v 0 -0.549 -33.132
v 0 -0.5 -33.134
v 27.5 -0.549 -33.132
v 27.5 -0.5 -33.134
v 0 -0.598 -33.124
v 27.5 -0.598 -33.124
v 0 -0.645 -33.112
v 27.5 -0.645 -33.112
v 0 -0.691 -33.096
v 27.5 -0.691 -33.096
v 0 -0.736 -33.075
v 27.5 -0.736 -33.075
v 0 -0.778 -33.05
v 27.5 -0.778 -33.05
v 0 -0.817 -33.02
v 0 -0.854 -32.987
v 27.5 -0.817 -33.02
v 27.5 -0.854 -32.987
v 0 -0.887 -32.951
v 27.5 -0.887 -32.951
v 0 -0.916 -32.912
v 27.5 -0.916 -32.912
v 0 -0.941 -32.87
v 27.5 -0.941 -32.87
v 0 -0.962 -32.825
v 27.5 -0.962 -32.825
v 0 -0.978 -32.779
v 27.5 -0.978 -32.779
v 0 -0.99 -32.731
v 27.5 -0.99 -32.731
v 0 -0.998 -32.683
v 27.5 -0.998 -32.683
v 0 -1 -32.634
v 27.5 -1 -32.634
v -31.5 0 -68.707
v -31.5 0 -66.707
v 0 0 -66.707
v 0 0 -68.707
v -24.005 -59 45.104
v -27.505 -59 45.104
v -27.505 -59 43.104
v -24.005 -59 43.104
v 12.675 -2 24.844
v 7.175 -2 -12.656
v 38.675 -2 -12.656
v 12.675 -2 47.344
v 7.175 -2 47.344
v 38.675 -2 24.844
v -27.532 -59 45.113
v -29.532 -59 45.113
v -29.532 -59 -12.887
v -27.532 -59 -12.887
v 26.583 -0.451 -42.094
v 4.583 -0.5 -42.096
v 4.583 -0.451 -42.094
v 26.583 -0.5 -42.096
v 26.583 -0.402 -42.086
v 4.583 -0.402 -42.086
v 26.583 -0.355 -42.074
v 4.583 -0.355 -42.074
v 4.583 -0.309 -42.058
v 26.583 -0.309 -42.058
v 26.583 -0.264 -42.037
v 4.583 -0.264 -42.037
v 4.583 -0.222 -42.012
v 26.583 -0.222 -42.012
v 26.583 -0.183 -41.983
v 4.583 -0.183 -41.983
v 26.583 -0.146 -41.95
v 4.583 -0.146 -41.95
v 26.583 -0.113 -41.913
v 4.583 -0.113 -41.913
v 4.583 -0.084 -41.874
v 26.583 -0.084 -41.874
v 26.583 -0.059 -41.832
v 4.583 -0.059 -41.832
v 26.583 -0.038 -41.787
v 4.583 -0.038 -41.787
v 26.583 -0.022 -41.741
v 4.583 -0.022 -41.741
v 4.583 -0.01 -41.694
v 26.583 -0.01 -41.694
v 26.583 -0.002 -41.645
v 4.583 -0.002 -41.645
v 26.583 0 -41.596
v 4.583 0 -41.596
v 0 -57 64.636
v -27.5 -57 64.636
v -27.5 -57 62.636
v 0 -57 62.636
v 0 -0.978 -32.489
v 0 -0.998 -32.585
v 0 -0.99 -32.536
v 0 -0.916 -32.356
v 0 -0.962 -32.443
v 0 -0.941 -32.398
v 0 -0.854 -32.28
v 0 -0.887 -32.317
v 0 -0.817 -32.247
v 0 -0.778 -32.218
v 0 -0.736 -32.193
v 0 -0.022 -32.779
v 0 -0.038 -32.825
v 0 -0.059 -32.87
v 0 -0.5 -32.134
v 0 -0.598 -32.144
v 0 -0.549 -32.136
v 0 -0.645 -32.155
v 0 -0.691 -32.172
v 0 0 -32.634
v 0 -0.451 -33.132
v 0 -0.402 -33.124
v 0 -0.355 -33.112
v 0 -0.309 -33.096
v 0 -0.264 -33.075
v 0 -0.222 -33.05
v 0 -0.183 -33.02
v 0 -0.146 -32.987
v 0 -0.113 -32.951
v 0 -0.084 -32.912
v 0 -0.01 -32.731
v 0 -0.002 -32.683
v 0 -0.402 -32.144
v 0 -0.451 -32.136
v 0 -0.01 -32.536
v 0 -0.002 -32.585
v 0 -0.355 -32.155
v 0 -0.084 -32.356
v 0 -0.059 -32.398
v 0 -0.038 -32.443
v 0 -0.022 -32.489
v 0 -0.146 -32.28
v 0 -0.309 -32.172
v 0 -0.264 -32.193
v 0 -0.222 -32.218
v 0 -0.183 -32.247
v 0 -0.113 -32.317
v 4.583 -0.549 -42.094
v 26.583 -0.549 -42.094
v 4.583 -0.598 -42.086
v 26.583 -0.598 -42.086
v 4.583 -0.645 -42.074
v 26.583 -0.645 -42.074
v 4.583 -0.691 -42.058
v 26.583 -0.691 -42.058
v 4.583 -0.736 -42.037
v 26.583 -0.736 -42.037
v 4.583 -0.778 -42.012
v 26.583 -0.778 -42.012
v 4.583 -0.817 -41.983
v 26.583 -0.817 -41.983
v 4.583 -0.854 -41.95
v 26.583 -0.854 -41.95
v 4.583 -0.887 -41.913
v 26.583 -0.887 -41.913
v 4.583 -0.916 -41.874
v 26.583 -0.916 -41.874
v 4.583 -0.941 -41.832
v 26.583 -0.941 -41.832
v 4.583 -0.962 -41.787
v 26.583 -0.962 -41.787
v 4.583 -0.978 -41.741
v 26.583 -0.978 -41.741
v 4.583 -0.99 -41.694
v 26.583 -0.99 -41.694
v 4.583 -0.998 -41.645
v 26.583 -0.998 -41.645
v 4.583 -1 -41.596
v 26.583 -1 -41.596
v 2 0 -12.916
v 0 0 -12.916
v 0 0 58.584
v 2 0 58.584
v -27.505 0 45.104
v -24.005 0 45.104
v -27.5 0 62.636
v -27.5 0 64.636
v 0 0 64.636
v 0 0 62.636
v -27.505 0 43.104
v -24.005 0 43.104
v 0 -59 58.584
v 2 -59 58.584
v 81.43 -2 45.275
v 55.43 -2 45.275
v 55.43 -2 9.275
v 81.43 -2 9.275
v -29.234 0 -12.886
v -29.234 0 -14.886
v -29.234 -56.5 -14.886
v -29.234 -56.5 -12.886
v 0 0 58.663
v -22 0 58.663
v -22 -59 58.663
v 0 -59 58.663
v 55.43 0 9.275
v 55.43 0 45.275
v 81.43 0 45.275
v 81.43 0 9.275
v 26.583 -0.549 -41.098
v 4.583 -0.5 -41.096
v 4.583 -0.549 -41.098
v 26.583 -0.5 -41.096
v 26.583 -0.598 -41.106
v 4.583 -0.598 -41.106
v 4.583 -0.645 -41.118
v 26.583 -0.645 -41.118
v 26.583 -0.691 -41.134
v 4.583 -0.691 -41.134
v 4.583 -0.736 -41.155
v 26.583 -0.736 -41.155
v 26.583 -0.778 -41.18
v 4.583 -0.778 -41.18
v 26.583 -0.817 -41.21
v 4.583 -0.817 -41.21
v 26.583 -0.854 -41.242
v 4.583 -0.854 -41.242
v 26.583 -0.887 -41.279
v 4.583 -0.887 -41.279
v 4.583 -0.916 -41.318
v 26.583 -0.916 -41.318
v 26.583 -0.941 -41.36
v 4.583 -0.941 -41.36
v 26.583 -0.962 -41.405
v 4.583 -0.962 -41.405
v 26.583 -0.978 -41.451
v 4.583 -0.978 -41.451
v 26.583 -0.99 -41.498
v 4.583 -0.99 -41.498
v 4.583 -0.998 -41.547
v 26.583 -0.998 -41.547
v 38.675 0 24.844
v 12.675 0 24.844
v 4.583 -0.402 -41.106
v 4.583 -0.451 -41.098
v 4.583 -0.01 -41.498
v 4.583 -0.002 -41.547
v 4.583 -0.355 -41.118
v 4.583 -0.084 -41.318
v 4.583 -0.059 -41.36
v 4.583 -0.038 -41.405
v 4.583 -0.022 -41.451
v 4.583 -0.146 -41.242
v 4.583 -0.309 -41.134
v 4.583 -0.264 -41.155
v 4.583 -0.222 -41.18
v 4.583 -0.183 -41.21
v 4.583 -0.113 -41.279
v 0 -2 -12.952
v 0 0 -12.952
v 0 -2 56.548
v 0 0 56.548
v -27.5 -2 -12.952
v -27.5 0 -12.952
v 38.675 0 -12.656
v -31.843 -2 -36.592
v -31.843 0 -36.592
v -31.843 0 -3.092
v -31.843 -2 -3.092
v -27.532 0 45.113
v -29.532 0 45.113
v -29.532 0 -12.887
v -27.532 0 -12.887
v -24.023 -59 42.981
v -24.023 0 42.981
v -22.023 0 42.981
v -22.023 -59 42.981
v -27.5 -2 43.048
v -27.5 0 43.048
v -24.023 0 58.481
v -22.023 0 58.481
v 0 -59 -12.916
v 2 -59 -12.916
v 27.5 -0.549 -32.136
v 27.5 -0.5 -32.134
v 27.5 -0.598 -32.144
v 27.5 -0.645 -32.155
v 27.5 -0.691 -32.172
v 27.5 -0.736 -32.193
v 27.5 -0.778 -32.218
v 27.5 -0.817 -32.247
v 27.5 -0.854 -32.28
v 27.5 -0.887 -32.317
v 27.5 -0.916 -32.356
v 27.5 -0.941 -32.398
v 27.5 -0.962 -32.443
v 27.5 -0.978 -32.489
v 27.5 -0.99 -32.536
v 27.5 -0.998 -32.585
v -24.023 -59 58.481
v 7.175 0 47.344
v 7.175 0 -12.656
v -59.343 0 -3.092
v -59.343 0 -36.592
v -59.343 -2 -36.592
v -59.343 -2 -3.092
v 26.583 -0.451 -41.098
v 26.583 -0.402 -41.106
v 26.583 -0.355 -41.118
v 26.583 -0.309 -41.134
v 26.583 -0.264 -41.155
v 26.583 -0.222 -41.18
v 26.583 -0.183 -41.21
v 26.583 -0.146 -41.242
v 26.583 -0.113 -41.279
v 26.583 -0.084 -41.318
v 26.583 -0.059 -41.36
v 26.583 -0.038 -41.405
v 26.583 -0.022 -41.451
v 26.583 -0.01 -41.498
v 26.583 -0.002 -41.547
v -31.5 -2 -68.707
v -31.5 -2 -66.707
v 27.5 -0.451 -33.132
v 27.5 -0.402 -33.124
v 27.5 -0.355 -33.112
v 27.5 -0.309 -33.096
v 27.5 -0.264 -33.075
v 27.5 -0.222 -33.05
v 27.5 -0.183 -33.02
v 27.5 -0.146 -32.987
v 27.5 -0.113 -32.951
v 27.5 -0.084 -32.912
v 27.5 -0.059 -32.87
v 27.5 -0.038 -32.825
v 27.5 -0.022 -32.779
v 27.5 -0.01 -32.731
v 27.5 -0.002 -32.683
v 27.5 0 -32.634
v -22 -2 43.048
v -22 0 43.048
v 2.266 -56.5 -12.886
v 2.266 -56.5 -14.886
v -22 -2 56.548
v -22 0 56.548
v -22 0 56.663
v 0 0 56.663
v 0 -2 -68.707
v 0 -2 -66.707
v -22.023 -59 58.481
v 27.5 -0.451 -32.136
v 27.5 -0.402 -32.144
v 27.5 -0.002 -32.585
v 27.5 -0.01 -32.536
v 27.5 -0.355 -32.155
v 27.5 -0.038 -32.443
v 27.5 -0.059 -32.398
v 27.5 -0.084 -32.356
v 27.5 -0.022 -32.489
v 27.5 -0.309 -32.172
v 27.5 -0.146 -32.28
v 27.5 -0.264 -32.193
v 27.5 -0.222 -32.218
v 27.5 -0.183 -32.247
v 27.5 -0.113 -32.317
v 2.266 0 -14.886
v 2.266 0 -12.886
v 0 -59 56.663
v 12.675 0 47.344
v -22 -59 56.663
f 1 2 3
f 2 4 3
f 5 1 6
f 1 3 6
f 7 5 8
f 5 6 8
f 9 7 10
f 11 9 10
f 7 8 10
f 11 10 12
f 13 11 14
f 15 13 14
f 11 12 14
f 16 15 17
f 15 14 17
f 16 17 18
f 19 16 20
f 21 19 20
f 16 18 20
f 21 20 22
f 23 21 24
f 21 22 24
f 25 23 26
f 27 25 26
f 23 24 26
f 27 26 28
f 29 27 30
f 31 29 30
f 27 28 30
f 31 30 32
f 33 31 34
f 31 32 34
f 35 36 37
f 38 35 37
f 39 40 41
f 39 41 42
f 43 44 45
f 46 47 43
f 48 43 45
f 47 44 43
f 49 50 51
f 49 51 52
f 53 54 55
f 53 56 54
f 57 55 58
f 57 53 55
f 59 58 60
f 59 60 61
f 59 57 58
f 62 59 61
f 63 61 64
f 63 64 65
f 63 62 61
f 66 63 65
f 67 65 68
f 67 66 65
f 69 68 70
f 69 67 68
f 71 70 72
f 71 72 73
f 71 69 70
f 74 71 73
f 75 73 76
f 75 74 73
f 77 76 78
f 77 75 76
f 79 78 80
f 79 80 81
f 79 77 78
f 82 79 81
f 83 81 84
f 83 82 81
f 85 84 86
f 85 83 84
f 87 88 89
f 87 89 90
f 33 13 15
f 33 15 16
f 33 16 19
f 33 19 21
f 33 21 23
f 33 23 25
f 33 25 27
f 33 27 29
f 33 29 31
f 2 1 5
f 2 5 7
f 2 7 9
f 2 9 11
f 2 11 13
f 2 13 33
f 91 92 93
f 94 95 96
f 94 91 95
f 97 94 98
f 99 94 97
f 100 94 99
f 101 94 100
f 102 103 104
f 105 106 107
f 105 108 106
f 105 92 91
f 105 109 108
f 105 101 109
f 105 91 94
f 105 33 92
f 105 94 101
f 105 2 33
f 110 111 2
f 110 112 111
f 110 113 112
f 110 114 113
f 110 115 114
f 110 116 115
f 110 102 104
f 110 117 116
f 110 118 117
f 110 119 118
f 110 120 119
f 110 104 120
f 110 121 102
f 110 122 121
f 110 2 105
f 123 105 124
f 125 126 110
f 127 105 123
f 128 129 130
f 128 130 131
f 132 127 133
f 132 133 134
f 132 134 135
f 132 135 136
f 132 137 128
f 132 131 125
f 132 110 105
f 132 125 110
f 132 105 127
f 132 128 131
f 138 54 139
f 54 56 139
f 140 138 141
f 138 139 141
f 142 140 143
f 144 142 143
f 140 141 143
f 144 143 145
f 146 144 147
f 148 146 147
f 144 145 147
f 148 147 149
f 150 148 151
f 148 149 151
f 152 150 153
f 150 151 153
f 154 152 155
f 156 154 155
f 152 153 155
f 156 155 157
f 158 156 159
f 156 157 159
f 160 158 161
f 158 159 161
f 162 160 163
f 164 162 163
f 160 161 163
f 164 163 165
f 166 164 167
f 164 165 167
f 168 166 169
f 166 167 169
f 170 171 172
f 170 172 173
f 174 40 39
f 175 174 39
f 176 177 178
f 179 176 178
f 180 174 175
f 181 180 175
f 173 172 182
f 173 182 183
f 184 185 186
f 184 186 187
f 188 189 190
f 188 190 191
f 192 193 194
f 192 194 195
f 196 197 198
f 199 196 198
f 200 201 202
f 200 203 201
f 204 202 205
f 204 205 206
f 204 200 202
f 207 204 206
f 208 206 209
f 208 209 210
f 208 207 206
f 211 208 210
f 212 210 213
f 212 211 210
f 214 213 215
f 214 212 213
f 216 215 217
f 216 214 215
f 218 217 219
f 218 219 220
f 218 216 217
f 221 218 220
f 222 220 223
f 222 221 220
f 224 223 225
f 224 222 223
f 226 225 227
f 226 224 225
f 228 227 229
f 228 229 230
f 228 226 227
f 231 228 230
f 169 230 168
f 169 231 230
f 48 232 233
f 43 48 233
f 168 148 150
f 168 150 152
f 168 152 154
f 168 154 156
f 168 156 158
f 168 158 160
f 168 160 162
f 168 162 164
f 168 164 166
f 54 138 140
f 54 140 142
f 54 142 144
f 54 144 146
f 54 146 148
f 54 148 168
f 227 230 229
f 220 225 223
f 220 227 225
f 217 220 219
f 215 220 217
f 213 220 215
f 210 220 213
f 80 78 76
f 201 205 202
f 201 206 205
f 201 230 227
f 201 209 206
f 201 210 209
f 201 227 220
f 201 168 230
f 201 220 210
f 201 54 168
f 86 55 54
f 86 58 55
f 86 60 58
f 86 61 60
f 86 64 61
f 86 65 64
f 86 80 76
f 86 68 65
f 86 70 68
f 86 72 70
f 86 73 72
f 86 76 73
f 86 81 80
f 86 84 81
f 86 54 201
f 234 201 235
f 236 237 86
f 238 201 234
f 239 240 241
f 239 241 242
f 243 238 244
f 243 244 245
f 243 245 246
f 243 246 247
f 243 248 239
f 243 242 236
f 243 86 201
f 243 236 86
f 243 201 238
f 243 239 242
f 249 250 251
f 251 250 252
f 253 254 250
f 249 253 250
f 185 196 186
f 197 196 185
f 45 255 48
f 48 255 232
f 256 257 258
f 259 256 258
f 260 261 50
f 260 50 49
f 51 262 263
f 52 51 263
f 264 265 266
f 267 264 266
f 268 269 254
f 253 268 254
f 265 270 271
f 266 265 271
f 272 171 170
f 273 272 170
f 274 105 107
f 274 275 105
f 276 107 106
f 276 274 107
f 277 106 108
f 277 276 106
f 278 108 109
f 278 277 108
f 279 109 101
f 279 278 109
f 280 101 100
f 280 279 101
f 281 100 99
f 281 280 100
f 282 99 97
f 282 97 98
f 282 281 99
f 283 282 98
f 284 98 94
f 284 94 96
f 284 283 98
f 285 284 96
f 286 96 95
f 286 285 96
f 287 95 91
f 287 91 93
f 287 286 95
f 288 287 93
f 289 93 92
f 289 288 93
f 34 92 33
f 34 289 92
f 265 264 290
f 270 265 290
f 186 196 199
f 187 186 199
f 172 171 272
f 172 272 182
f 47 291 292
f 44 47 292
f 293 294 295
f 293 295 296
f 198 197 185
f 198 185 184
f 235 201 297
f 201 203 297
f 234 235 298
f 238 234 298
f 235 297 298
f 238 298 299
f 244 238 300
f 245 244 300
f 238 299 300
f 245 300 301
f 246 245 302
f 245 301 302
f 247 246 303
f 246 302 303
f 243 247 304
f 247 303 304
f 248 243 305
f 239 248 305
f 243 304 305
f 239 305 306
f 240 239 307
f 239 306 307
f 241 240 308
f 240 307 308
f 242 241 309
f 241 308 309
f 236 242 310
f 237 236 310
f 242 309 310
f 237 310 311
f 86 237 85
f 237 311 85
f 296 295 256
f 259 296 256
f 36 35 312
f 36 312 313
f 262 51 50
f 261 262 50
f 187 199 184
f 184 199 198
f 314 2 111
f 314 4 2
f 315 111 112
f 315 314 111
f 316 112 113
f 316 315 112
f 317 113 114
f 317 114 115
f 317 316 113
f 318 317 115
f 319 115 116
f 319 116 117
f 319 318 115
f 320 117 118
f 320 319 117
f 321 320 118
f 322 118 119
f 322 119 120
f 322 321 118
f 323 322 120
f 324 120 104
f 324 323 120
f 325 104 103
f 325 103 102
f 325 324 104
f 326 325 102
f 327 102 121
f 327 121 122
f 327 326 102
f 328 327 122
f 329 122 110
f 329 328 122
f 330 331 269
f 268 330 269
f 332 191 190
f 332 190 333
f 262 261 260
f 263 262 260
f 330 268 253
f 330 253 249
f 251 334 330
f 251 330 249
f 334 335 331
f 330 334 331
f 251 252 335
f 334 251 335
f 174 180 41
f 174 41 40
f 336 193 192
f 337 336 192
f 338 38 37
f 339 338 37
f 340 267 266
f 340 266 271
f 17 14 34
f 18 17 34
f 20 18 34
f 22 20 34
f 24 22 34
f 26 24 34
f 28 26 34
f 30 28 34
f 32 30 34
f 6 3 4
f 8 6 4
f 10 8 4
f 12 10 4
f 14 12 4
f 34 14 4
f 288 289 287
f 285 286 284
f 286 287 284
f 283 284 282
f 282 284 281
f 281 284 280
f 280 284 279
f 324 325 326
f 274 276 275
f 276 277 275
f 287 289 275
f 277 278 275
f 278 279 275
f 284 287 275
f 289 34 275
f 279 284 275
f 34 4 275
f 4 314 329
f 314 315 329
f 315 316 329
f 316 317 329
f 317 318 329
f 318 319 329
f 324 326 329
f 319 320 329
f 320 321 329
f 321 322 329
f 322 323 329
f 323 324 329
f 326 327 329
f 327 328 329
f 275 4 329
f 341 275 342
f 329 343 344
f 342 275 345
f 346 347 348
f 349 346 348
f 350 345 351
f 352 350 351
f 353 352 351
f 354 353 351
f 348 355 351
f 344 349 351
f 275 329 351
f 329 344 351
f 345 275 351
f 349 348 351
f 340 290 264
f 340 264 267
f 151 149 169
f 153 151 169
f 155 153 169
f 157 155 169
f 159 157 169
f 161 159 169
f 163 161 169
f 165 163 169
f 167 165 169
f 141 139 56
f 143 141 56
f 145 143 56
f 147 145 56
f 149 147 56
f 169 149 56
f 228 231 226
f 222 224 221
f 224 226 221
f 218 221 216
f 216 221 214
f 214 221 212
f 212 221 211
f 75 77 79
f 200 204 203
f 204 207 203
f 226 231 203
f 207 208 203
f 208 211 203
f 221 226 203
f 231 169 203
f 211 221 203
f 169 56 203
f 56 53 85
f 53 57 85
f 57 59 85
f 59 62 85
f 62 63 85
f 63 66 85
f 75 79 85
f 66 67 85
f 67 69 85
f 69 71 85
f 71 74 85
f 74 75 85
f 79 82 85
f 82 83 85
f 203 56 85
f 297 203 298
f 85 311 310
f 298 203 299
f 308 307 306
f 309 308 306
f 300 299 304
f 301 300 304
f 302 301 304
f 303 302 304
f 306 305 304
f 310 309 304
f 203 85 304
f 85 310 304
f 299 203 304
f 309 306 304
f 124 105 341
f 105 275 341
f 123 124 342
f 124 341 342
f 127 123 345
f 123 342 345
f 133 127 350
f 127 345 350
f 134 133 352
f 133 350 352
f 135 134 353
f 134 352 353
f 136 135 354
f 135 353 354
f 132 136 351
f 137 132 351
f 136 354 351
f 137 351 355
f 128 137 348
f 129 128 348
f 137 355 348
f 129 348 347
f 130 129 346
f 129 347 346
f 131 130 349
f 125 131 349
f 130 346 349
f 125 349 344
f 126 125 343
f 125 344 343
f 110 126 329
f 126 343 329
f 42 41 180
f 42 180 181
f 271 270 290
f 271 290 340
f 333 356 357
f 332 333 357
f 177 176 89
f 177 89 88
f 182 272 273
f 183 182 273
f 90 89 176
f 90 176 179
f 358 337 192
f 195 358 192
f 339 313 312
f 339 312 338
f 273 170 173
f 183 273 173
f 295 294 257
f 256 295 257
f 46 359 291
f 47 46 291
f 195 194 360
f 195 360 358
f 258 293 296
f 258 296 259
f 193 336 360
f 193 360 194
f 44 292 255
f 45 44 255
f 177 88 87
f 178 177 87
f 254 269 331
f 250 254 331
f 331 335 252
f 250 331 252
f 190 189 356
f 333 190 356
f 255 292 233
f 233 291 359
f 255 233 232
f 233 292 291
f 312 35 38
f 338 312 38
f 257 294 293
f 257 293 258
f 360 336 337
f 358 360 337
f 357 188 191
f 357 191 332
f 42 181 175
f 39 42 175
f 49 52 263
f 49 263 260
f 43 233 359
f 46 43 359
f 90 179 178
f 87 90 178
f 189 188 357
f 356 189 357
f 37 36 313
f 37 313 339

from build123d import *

# Parameters (mm, degrees)
F1_DEPTH  = 2
F2_W      = 2
F2_H      = 15.5
F3_DEPTH  = 59
F4_W      = 3.5
F4_H      = 2
F5_DEPTH  = 59
F6_W      = 2
F6_H      = 71.5
F7_DEPTH  = 59
F8_W      = 2
F8_H      = 58
F9_DEPTH  = 59
F10_W     = 22
F10_H     = 2
F11_DEPTH = 59
F12_W     = 31.5
F12_H     = 2
F13_DEPTH = 56.5
F14_W     = 27.5
F14_H     = 2
F15_DEPTH = 57
F17_DEPTH = 2
F18_W     = 27.5
F18_H     = 33.5
F19_DEPTH = 2
F20_W     = 26
F20_H     = 36
F21_DEPTH = 2
F22_W     = 27.5
F22_H     = 1
F23_DEPTH = 1
F24_R     = 0.49999
F25_W     = 22
F25_H     = 1
F26_DEPTH = 1
F27_R     = 0.49999
F28_W     = 31.5
F28_H     = 2
F29_DEPTH = 2


# Not quite as in the source:
# - a fillet or chamfer is up to 0.001 mm smaller than in the source, because OpenCascade refuses the exact size


with BuildPart() as f1:
    # F0 (on Front) → F1 (new body)
    with BuildSketch(Plane.XZ):
        Polygon((-22, 43.0476225019), (-27.5, 43.0476225019), (-27.5, -12.9523774981), (0, -12.9523774981), (0, 56.5476225019), (-22, 56.5476225019), align=None)
    extrude(amount=F1_DEPTH)


with BuildPart() as f3:
    # F2 (on Front) → F3 (new body)
    with BuildSketch(Plane.XZ):
        with Locations((-23.0228824764, 50.7314585745)):
            Rectangle(F2_W, F2_H)
    extrude(amount=F3_DEPTH)


with BuildPart() as f5:
    # F4 (on Front) → F5 (new body)
    with BuildSketch(Plane.XZ):
        with Locations((-25.7554331869, 44.1044030488)):
            Rectangle(F4_W, F4_H)
    extrude(amount=F5_DEPTH)


with BuildPart() as f7:
    # F6 (on Front) → F7 (new body)
    with BuildSketch(Plane.XZ):
        with Locations((1, 22.834235996)):
            Rectangle(F6_W, F6_H)
    extrude(amount=F7_DEPTH)


with BuildPart() as f9:
    # F8 (on Front) → F9 (new body)
    with BuildSketch(Plane.XZ):
        with Locations((-28.5317020714, 16.1130948886)):
            Rectangle(F8_W, F8_H)
    extrude(amount=F9_DEPTH)


with BuildPart() as f11:
    # F10 (on Front) → F11 (new body)
    with BuildSketch(Plane.XZ):
        with Locations((-11, 57.6625595093)):
            Rectangle(F10_W, F10_H)
    extrude(amount=F11_DEPTH)


with BuildPart() as f13:
    # F12 (on Front) → F13 (new body)
    with BuildSketch(Plane.XZ):
        with Locations((-13.4842316415, -13.8856245428)):
            Rectangle(F12_W, F12_H)
    extrude(amount=F13_DEPTH)


with BuildPart() as f15:
    # F14 (on Front) → F15 (new body)
    with BuildSketch(Plane.XZ):
        with Locations((-13.75, 63.635656774)):
            Rectangle(F14_W, F14_H)
    extrude(amount=F15_DEPTH)


with BuildPart() as f17:
    # F16 (on Front) → F17 (new body)
    with BuildSketch(Plane.XZ):
        Polygon((7.1751703918, 24.8444598615), (7.1751703918, -12.6555401385), (38.6751703918, -12.6555401385), (38.6751703918, 24.8444598615), (12.6751703918, 24.8444598615), (12.6751703918, 47.3444598615), (7.1751703918, 47.3444598615), align=None)
    extrude(amount=F17_DEPTH)


with BuildPart() as f19:
    # F18 (on Front) → F19 (new body)
    with BuildSketch(Plane.XZ):
        with Locations((-45.5933791399, -19.8420215845)):
            Rectangle(F18_W, F18_H)
    extrude(amount=F19_DEPTH)


with BuildPart() as f21:
    # F20 (on Front) → F21 (new body)
    with BuildSketch(Plane.XZ):
        with Locations((68.4304798841, 27.2750734985)):
            Rectangle(F20_W, F20_H)
    extrude(amount=F21_DEPTH)


with BuildPart() as f23:
    # F22 (on Front) → F23 (new body)
    with BuildSketch(Plane.XZ):
        with Locations((13.75, -32.6339128315)):
            Rectangle(F22_W, F22_H)
    extrude(amount=F23_DEPTH)

    # F24 (radius 0.5 in the source; OpenCascade refuses exactly that, so slightly less here)
    f24_edges = [f23.edges().sort_by_distance(p)[0] for p in [
        (13.75, -1, -33.133913),
        (13.75, -1, -32.133913),
        (13.75, 0, -33.133913),
        (13.75, 0, -32.133913),
    ]]
    fillet(f24_edges, radius=F24_R)


with BuildPart() as f26:
    # F25 (on Front) → F26 (new body)
    with BuildSketch(Plane.XZ):
        with Locations((15.5834236741, -41.5960076153)):
            Rectangle(F25_W, F25_H)
    extrude(amount=F26_DEPTH)

    # F27 (radius 0.5 in the source; OpenCascade refuses exactly that, so slightly less here)
    f27_edges = [f26.edges().sort_by_distance(p)[0] for p in [
        (15.583424, -1, -41.096008),
        (15.583424, -1, -42.096008),
        (15.583424, 0, -42.096008),
        (15.583424, 0, -41.096008),
    ]]
    fillet(f27_edges, radius=F27_R)


with BuildPart() as f29:
    # F28 (on Front) → F29 (new body)
    with BuildSketch(Plane.XZ):
        with Locations((-15.75, -67.7069892883)):
            Rectangle(F28_W, F28_H)
    extrude(amount=F29_DEPTH)


solid = Compound([f1.part, f3.part, f5.part, f7.part, f9.part, f11.part, f13.part, f15.part, f17.part, f19.part, f21.part, f23.part, f26.part, f29.part])
